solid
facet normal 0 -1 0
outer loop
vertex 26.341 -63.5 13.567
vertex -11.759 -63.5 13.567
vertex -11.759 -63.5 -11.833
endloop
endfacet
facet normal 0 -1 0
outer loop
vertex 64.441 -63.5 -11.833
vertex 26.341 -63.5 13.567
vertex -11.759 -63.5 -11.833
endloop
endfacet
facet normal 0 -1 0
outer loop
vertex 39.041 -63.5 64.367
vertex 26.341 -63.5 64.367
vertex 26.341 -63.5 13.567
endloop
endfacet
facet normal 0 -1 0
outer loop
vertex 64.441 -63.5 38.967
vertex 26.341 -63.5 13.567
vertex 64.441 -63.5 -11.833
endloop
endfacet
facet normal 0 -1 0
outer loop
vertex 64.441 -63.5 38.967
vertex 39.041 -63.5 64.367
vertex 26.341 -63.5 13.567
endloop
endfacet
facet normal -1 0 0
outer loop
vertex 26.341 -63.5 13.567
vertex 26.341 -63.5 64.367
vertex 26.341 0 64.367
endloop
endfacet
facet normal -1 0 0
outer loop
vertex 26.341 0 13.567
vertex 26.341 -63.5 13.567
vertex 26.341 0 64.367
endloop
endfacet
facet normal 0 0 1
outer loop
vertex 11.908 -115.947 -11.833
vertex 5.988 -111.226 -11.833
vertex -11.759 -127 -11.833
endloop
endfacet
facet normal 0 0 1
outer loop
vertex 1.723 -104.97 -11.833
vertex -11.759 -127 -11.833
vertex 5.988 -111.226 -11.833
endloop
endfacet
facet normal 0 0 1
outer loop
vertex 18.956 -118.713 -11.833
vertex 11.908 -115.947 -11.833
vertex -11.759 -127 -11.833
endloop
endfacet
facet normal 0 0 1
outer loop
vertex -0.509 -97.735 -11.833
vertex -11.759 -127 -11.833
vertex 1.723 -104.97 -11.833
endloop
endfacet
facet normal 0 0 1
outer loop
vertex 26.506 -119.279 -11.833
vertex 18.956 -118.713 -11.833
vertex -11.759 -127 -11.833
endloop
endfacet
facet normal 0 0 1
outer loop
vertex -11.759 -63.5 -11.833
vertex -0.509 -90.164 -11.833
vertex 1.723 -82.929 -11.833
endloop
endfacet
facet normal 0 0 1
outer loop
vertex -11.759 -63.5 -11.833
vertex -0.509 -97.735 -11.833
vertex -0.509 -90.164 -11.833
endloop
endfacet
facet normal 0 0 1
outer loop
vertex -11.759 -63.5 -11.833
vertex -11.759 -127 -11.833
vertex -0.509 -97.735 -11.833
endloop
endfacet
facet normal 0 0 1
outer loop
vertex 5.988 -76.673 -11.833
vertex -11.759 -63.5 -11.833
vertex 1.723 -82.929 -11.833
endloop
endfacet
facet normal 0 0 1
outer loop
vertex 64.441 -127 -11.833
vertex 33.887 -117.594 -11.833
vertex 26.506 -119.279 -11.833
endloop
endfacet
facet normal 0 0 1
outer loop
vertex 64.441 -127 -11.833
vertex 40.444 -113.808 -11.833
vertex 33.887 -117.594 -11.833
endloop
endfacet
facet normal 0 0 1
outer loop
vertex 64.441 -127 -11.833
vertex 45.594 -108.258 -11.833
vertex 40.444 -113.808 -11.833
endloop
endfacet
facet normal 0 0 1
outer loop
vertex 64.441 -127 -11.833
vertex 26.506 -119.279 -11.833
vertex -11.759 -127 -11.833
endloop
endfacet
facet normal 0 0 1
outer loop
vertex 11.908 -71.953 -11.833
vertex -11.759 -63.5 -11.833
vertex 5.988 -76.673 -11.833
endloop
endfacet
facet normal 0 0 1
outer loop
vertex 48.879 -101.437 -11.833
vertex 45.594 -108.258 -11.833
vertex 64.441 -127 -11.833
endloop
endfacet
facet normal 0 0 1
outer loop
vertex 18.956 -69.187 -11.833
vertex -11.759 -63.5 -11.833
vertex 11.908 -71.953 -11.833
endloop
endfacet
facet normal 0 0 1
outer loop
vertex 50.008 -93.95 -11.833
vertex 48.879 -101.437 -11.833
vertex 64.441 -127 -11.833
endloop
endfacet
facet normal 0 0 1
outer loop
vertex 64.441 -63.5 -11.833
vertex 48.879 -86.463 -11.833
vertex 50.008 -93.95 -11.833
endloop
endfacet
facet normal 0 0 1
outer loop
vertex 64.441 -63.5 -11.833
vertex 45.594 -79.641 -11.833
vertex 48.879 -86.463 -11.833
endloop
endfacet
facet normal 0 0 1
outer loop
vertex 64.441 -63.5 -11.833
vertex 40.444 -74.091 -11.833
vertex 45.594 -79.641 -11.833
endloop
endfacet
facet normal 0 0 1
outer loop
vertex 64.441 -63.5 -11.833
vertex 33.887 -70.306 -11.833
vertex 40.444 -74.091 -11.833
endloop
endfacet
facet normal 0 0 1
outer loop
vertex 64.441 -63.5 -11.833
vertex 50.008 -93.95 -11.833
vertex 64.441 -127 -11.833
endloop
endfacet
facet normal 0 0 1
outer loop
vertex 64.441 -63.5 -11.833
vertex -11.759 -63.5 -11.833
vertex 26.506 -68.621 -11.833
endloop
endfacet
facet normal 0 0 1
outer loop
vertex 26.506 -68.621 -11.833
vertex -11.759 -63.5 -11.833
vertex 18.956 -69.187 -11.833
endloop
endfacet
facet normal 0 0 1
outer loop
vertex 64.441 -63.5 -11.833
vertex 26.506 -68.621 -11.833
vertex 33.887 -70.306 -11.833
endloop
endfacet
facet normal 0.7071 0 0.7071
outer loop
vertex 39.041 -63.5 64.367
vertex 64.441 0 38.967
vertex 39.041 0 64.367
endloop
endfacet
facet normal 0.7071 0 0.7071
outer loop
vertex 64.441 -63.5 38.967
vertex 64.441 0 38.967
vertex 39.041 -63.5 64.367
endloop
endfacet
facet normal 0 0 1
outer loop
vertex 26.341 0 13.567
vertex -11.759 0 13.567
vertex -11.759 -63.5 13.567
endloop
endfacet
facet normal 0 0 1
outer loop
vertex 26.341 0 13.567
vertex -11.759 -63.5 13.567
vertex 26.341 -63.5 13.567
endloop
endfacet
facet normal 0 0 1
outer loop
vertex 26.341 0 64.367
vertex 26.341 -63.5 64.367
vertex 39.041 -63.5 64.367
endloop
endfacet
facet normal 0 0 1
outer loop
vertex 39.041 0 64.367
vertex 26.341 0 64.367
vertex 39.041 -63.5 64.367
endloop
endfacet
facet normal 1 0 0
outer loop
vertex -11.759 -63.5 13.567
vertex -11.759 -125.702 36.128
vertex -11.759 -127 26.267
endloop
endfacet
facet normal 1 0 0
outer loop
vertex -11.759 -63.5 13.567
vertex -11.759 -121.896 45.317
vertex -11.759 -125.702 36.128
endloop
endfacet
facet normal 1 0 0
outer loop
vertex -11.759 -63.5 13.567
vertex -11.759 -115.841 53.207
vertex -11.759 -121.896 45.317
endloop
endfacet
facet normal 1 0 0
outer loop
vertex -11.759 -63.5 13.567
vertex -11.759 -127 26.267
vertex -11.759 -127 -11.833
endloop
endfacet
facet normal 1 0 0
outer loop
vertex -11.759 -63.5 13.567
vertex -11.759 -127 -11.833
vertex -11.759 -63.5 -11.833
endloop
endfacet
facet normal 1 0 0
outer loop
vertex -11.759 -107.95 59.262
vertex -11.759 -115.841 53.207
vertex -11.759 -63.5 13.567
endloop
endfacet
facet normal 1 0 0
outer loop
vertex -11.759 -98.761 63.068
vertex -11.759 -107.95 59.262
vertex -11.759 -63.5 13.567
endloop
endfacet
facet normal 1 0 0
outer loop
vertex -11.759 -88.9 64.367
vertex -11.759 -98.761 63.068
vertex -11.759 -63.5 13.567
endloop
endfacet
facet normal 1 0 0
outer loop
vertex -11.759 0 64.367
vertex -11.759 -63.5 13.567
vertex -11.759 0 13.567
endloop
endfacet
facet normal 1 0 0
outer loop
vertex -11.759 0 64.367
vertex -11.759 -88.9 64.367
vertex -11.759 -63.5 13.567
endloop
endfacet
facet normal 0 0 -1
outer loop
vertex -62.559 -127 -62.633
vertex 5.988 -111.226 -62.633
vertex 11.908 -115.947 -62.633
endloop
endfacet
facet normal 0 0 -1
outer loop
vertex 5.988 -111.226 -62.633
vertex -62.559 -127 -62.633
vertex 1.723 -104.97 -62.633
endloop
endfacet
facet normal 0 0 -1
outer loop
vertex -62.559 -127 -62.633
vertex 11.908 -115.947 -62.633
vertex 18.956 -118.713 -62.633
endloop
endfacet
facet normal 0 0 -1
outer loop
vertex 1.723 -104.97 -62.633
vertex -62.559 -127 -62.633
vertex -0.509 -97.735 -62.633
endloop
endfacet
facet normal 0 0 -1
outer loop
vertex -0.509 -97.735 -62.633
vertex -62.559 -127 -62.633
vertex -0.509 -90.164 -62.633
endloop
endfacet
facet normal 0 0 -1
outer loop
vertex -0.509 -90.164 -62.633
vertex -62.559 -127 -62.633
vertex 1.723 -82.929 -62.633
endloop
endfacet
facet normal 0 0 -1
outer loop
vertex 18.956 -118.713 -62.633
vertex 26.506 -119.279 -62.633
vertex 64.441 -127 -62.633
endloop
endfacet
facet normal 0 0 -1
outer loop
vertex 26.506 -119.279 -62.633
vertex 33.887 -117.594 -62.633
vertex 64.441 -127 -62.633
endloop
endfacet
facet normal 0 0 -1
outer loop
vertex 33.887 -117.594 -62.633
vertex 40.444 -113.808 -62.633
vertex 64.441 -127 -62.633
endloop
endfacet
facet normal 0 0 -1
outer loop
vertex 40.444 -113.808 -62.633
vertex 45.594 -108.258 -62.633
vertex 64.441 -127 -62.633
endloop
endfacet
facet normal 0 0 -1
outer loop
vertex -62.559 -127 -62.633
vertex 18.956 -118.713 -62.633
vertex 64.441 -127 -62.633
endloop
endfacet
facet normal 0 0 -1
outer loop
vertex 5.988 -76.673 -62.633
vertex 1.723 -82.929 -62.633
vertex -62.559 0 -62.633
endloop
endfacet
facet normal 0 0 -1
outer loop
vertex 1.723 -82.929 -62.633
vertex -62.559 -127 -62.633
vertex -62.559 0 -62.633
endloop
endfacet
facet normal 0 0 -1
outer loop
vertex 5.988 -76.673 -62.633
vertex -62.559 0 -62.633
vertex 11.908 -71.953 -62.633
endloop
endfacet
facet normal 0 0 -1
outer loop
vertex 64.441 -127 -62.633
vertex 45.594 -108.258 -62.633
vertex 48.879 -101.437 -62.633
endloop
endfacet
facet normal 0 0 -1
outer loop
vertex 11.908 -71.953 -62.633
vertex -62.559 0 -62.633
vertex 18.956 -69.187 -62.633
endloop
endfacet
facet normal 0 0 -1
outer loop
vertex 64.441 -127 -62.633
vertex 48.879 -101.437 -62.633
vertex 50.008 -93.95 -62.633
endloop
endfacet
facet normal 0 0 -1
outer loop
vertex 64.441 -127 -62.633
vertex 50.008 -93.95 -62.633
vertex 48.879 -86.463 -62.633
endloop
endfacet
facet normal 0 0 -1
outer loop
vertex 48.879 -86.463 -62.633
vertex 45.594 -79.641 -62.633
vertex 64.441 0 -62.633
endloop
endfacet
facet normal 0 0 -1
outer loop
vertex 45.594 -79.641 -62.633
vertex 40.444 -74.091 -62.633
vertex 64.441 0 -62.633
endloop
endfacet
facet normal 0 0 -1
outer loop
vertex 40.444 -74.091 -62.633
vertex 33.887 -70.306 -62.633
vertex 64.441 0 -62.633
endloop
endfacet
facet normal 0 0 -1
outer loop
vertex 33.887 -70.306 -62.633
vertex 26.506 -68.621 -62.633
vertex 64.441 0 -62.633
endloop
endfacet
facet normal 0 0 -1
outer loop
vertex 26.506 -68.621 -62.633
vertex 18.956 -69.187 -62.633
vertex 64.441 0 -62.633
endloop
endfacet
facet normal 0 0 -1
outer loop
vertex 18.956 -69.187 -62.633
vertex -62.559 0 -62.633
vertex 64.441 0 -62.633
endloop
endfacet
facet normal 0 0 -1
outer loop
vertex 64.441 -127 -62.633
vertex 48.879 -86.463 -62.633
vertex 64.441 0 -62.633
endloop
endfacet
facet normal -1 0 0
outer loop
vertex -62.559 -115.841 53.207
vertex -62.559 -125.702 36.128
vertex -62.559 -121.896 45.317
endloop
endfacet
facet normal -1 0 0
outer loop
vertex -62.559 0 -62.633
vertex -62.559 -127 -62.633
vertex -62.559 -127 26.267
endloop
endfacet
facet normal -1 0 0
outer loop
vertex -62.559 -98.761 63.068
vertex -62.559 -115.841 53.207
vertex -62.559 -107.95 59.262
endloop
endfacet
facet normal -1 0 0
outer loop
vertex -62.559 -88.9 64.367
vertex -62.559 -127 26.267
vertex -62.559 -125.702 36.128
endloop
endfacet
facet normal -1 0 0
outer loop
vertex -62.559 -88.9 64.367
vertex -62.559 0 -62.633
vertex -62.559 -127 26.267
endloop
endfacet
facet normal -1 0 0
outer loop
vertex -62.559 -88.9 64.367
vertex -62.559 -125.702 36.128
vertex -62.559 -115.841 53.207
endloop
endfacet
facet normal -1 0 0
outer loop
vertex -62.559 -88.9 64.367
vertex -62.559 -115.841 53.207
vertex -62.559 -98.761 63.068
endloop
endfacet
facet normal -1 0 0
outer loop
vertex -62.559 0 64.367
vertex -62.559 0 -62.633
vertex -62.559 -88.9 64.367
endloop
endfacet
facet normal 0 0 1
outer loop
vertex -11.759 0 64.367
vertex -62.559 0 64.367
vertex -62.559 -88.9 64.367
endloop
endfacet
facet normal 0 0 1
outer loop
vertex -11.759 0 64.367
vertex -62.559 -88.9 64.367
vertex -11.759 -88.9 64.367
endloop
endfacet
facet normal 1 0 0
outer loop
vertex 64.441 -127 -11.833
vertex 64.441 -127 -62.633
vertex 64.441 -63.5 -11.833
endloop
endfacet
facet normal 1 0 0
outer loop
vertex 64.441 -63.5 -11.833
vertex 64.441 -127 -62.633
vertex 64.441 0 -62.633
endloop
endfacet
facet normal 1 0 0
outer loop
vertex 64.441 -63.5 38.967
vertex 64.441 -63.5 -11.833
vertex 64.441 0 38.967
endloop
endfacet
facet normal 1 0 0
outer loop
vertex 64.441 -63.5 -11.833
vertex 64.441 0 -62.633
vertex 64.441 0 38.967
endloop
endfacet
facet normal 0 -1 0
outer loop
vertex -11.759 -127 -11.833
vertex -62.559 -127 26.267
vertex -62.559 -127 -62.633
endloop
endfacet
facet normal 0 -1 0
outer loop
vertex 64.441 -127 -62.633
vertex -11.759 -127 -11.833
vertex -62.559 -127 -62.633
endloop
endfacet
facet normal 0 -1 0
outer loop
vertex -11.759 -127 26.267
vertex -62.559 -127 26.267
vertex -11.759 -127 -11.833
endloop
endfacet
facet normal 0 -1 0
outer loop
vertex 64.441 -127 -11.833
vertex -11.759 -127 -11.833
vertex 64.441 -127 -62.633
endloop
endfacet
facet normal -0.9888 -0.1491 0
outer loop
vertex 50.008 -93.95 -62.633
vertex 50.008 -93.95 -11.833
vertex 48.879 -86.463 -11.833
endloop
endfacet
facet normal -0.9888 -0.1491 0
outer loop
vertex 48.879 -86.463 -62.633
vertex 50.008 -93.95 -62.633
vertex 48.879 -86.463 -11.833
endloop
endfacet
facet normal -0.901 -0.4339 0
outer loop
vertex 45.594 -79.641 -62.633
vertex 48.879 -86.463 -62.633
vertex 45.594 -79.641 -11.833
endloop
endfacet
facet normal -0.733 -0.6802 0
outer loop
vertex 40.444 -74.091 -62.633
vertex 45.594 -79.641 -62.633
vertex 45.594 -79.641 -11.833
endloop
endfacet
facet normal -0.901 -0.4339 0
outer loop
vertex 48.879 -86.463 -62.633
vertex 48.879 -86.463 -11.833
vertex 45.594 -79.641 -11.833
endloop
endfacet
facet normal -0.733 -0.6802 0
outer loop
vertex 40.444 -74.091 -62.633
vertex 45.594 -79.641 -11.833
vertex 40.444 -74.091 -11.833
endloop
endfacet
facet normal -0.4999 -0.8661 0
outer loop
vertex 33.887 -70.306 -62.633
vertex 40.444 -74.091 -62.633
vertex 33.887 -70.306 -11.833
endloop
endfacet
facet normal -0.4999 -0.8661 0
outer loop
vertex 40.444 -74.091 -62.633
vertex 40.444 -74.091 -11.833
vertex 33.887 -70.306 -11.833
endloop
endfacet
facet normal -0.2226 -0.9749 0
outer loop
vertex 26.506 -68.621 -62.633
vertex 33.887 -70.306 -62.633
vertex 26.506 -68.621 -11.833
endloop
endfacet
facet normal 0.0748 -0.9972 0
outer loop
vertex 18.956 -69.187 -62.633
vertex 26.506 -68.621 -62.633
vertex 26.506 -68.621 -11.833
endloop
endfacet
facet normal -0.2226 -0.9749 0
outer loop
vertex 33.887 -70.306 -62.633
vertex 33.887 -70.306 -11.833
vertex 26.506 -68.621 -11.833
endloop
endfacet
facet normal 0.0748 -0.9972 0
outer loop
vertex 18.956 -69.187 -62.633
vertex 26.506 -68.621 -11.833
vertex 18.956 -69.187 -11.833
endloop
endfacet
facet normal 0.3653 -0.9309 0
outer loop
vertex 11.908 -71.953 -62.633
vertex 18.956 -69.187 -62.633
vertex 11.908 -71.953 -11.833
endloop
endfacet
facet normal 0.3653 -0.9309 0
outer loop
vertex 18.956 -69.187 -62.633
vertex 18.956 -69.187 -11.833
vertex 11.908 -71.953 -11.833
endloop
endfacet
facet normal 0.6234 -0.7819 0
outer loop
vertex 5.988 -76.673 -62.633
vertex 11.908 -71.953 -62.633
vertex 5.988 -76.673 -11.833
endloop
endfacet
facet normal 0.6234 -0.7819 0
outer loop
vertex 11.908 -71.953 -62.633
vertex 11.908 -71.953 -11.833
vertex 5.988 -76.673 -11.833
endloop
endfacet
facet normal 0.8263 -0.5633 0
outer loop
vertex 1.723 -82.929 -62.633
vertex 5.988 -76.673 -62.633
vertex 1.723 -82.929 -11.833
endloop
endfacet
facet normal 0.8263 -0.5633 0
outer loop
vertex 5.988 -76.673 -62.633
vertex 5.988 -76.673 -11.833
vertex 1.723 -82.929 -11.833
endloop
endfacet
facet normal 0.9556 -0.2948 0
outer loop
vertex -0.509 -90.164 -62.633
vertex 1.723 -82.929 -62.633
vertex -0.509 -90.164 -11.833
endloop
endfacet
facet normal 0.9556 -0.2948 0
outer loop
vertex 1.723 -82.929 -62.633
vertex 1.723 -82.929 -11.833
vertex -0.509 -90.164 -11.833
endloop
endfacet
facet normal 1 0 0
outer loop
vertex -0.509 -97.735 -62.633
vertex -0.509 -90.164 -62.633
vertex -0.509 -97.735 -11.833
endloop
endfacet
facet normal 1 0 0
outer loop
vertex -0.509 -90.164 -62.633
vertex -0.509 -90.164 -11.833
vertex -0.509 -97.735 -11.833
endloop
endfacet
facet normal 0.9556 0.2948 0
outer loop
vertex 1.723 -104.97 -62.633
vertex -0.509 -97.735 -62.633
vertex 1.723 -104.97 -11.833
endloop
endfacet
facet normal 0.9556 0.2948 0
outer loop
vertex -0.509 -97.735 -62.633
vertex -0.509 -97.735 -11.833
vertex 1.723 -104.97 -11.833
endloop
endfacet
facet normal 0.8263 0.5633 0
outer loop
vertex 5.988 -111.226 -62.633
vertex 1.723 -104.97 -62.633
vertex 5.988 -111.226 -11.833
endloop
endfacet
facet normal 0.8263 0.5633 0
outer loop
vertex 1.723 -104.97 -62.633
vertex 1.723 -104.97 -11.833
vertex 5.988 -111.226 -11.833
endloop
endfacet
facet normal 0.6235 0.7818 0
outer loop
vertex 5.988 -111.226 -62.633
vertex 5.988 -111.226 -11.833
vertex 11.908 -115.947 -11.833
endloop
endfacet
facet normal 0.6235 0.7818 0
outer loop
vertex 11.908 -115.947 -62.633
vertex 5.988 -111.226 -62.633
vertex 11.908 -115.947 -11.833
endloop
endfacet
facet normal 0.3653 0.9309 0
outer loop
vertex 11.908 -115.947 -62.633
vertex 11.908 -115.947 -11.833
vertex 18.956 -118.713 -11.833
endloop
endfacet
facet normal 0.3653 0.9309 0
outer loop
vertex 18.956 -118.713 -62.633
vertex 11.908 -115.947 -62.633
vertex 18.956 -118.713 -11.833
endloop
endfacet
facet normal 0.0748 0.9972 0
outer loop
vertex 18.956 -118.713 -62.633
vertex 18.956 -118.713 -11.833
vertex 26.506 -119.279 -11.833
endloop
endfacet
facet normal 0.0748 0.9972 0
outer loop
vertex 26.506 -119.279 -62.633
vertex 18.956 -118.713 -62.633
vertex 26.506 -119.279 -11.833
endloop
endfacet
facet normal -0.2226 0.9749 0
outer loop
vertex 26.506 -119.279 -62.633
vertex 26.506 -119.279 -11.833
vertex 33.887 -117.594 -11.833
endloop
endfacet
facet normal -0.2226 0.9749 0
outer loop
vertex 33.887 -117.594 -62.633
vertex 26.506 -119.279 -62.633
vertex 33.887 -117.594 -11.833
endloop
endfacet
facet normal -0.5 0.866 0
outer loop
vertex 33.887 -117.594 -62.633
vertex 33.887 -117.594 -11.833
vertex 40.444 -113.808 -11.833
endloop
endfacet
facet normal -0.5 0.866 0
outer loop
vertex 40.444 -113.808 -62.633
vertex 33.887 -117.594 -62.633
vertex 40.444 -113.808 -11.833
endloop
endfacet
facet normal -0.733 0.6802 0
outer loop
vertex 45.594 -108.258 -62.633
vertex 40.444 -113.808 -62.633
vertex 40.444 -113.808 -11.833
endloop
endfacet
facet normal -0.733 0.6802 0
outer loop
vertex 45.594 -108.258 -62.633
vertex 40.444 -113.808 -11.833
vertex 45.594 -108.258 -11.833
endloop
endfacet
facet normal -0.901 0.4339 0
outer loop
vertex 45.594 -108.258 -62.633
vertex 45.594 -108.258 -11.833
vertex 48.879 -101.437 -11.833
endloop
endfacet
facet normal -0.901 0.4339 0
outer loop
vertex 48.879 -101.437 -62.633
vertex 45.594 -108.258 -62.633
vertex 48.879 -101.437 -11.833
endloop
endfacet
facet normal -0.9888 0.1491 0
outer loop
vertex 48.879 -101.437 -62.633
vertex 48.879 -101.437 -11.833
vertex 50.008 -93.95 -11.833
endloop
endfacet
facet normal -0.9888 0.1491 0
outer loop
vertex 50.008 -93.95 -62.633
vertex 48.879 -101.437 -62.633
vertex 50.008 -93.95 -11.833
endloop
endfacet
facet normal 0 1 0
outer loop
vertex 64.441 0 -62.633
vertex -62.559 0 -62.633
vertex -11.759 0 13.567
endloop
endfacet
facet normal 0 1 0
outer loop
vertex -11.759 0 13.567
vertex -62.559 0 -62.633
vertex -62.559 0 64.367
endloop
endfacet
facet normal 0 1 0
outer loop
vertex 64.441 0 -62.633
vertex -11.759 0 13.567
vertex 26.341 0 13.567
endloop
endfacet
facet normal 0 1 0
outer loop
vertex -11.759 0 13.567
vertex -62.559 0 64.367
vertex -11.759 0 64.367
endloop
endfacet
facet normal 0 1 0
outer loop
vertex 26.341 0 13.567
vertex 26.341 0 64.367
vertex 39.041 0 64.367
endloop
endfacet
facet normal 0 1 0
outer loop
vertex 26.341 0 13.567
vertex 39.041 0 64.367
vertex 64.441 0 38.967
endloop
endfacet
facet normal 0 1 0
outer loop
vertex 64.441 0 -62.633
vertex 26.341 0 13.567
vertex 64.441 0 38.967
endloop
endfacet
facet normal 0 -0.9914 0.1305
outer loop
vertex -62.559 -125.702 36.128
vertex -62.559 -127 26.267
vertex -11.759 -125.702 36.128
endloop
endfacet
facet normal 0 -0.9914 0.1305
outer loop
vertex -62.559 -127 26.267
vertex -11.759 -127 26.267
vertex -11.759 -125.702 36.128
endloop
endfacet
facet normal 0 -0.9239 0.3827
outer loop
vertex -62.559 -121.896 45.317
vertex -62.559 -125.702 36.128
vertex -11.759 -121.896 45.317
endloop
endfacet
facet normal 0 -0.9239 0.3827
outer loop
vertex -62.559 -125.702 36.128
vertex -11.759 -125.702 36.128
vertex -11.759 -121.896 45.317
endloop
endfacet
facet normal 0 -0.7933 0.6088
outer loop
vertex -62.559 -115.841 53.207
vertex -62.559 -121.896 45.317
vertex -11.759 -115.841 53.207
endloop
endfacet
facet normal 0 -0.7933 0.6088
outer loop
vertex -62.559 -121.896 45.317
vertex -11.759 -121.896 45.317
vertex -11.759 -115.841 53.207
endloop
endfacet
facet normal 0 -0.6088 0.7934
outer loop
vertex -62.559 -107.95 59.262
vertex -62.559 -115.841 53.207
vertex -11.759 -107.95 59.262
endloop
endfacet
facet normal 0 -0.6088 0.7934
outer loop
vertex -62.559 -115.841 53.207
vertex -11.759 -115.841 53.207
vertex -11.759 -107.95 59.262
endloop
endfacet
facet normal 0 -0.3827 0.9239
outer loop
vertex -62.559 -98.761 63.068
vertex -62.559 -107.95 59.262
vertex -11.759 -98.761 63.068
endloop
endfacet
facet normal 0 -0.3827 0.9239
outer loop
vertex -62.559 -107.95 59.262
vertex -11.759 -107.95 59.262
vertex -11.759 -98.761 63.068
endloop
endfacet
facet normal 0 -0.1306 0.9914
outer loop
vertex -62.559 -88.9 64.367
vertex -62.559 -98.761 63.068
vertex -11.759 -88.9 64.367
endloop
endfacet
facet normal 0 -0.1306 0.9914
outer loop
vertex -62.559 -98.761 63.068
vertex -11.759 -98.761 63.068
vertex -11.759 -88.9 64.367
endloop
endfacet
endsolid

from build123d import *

# Parameters (mm, degrees)
F0_W     = 127
F0_H     = 127
F1_DEPTH = 127
F2_W     = 76.2
F2_H     = 63.5
F3_DEPTH = 76.2
F4_R     = 25.4
F5_DEPTH = 76.2
F6_W     = 38.1
F6_H     = 63.5
F7_DEPTH = 50.8
F8_R     = 38.1
F9_SIZE  = 25.4


with BuildPart() as f1:
    # F0 (on Front) → F1 (new body)
    with BuildSketch(Plane.XZ):
        with Locations((0.941295, 0.866529)):
            Rectangle(F0_W, F0_H)
    extrude(amount=F1_DEPTH)

    # F2 (on face) → F3 (cut)
    with BuildSketch(Plane.XY.offset(64.366529)):
        with Locations((26.341295, -95.25)):
            Rectangle(F2_W, F2_H)
    extrude(amount=-F3_DEPTH, mode=Mode.SUBTRACT)

    # F4 (on face) → F5 (cut)
    with BuildSketch(Plane.XY.offset(-11.833471)):
        with Locations((24.607655, -93.949772)):
            Circle(F4_R)
    extrude(amount=-F5_DEPTH, mode=Mode.SUBTRACT)

    # F6 (on face) → F7 (cut)
    with BuildSketch(Plane.XY.offset(64.366529)):
        with Locations((7.291295, -31.75)):
            Rectangle(F6_W, F6_H)
    extrude(amount=-F7_DEPTH, mode=Mode.SUBTRACT)

    # F8
    f8_edges = [f1.edges().sort_by_distance(p)[0] for p in [
        (-37.158705, -127, 64.366529),
    ]]
    fillet(f8_edges, radius=F8_R)

    # F9
    f9_edges = [f1.edges().sort_by_distance(p)[0] for p in [
        (64.441295, -31.75, 64.366529),
    ]]
    chamfer(f9_edges, length=F9_SIZE)


solid = f1.part
